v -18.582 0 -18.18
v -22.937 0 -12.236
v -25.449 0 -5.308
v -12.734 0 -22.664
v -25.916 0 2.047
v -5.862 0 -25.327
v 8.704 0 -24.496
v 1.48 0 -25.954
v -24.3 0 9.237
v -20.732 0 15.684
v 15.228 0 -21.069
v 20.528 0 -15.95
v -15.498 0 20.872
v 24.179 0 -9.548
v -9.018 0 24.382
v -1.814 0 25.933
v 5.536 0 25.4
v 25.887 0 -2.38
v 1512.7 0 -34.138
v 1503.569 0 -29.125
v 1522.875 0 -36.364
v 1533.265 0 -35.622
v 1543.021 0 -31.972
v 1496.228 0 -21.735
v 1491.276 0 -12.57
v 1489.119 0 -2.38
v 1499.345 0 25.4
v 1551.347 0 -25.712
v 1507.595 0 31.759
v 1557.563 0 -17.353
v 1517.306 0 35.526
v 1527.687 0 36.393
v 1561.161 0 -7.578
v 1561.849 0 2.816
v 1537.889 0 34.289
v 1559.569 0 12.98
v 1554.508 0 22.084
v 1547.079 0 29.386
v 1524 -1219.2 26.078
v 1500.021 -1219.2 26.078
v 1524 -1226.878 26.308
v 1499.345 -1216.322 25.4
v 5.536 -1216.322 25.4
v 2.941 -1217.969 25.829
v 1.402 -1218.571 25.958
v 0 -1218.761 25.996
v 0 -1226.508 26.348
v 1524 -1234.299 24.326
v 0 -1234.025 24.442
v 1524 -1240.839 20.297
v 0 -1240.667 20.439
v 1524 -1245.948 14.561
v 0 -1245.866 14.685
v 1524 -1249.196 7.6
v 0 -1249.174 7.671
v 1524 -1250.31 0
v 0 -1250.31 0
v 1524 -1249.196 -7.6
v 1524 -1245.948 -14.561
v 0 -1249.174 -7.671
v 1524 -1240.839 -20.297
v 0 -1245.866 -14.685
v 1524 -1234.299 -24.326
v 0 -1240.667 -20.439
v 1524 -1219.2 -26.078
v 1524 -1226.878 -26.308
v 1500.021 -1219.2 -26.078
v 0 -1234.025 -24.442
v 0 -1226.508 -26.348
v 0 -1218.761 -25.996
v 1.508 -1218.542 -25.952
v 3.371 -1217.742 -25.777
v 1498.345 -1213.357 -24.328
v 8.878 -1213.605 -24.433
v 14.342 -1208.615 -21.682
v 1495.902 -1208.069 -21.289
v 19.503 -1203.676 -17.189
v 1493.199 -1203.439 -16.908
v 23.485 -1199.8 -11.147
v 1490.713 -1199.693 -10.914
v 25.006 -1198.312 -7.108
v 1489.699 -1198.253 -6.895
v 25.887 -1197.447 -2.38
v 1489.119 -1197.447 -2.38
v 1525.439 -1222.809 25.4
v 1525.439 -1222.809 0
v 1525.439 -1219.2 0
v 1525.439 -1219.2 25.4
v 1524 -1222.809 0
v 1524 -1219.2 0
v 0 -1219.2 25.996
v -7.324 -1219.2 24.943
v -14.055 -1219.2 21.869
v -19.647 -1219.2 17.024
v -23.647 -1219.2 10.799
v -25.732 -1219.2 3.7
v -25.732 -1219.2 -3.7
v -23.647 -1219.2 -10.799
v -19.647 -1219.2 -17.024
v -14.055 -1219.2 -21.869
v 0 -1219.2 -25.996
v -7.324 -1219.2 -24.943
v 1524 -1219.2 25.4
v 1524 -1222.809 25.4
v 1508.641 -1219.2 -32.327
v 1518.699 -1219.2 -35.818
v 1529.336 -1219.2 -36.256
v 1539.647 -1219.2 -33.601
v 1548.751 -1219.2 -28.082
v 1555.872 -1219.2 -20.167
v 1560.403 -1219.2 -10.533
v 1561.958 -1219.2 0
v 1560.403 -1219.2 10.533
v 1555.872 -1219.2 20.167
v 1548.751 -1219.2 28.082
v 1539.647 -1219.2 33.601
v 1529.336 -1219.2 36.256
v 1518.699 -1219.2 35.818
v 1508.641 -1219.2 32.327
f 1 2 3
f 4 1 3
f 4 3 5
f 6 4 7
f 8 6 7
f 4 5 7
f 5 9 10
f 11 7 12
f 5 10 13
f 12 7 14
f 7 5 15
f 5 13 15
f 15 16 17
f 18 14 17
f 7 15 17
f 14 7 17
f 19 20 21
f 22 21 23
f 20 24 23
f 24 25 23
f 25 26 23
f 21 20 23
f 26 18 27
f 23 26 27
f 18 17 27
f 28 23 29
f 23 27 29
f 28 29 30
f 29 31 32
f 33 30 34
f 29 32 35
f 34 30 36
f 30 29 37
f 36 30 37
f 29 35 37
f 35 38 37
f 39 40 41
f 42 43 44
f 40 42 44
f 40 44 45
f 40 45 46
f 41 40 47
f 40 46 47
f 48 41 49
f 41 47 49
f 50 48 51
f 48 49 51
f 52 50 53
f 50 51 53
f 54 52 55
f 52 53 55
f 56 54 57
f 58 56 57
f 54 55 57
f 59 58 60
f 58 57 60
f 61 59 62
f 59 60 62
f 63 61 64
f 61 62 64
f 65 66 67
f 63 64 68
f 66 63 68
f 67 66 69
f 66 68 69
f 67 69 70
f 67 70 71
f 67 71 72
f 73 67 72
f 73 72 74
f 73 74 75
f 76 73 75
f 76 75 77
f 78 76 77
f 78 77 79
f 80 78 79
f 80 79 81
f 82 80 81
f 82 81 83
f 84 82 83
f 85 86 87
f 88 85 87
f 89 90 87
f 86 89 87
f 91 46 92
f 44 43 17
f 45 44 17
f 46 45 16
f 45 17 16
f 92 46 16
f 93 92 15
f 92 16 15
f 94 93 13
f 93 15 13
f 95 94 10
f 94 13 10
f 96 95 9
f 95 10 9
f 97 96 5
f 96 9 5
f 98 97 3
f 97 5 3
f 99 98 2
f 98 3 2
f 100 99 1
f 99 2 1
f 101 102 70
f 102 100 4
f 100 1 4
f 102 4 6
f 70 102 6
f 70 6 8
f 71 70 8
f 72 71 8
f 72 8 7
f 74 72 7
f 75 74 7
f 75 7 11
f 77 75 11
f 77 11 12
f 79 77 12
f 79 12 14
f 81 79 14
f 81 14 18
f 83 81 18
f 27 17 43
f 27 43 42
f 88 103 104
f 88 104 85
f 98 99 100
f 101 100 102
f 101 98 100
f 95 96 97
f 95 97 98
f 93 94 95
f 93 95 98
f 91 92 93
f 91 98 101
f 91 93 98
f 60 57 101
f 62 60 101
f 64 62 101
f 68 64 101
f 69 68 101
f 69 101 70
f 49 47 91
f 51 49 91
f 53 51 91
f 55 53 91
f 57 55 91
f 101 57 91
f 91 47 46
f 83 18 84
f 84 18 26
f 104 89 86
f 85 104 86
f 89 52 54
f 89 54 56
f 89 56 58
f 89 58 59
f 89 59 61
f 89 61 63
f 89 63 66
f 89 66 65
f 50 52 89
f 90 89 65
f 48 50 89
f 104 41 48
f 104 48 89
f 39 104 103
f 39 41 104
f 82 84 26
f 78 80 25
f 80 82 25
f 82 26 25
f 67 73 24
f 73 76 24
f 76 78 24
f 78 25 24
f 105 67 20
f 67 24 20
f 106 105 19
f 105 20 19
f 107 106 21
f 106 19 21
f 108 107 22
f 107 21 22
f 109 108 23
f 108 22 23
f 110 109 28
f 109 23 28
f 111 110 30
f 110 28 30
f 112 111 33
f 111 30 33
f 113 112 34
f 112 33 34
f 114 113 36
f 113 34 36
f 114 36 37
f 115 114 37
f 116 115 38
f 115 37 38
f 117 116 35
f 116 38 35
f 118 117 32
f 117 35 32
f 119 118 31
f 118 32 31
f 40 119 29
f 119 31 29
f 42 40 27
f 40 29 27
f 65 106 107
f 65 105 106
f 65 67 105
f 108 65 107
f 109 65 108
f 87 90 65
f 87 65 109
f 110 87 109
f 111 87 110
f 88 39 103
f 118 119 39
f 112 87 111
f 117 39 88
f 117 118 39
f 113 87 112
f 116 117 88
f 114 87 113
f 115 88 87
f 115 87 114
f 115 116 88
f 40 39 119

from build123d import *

# Parameters (mm, degrees)
F2_R      = 25.9962792711
F3_DEPTH  = 1219.2
F4_R      = 26.4847844062
F5_DEPTH  = 1524
F6_R      = 36.4583411444
F7_DEPTH  = 1219.2
F8_W      = 1525.4385471344
F8_H      = 1222.8087186813
F9_DEPTH  = 25.4
F15_DEPTH = 27.77983


# Not quite as in the source:
# - the program builds the solid bodies; features that only make, move or delete a surface that nothing else refers to are left out


with BuildPart() as f3:
    # F2 (on Front) → F3 (new body)
    with BuildSketch(Plane.XZ):
        Circle(F2_R)
    extrude(amount=F3_DEPTH)

    # F4 (on Right) → F5 (join)
    with BuildSketch(Plane.YZ):
        with Locations((-1223.8247394562, 0)):
            Circle(F4_R)
    extrude(amount=F5_DEPTH)

    # F6 (on Front) → F7 (join)
    with BuildSketch(Plane.XZ):
        with Locations((1525.4992246628, 0)):
            Circle(F6_R)
    extrude(amount=F7_DEPTH)

    # F8 (on Top) → F9 (join)
    with BuildSketch(Plane.XY):
        with Locations((762.7192735672, -611.4043593407)):
            Rectangle(F8_W, F8_H)
    extrude(amount=F9_DEPTH)

    # F15 (add): a face of the model
    f15_faces = [f3.faces().sort_by_distance(p)[0] for p in [
        (752.4403971283, -608.161243113, 25.4),
    ]]
    extrude(f15_faces, amount=-F15_DEPTH)


solid = f3.part
